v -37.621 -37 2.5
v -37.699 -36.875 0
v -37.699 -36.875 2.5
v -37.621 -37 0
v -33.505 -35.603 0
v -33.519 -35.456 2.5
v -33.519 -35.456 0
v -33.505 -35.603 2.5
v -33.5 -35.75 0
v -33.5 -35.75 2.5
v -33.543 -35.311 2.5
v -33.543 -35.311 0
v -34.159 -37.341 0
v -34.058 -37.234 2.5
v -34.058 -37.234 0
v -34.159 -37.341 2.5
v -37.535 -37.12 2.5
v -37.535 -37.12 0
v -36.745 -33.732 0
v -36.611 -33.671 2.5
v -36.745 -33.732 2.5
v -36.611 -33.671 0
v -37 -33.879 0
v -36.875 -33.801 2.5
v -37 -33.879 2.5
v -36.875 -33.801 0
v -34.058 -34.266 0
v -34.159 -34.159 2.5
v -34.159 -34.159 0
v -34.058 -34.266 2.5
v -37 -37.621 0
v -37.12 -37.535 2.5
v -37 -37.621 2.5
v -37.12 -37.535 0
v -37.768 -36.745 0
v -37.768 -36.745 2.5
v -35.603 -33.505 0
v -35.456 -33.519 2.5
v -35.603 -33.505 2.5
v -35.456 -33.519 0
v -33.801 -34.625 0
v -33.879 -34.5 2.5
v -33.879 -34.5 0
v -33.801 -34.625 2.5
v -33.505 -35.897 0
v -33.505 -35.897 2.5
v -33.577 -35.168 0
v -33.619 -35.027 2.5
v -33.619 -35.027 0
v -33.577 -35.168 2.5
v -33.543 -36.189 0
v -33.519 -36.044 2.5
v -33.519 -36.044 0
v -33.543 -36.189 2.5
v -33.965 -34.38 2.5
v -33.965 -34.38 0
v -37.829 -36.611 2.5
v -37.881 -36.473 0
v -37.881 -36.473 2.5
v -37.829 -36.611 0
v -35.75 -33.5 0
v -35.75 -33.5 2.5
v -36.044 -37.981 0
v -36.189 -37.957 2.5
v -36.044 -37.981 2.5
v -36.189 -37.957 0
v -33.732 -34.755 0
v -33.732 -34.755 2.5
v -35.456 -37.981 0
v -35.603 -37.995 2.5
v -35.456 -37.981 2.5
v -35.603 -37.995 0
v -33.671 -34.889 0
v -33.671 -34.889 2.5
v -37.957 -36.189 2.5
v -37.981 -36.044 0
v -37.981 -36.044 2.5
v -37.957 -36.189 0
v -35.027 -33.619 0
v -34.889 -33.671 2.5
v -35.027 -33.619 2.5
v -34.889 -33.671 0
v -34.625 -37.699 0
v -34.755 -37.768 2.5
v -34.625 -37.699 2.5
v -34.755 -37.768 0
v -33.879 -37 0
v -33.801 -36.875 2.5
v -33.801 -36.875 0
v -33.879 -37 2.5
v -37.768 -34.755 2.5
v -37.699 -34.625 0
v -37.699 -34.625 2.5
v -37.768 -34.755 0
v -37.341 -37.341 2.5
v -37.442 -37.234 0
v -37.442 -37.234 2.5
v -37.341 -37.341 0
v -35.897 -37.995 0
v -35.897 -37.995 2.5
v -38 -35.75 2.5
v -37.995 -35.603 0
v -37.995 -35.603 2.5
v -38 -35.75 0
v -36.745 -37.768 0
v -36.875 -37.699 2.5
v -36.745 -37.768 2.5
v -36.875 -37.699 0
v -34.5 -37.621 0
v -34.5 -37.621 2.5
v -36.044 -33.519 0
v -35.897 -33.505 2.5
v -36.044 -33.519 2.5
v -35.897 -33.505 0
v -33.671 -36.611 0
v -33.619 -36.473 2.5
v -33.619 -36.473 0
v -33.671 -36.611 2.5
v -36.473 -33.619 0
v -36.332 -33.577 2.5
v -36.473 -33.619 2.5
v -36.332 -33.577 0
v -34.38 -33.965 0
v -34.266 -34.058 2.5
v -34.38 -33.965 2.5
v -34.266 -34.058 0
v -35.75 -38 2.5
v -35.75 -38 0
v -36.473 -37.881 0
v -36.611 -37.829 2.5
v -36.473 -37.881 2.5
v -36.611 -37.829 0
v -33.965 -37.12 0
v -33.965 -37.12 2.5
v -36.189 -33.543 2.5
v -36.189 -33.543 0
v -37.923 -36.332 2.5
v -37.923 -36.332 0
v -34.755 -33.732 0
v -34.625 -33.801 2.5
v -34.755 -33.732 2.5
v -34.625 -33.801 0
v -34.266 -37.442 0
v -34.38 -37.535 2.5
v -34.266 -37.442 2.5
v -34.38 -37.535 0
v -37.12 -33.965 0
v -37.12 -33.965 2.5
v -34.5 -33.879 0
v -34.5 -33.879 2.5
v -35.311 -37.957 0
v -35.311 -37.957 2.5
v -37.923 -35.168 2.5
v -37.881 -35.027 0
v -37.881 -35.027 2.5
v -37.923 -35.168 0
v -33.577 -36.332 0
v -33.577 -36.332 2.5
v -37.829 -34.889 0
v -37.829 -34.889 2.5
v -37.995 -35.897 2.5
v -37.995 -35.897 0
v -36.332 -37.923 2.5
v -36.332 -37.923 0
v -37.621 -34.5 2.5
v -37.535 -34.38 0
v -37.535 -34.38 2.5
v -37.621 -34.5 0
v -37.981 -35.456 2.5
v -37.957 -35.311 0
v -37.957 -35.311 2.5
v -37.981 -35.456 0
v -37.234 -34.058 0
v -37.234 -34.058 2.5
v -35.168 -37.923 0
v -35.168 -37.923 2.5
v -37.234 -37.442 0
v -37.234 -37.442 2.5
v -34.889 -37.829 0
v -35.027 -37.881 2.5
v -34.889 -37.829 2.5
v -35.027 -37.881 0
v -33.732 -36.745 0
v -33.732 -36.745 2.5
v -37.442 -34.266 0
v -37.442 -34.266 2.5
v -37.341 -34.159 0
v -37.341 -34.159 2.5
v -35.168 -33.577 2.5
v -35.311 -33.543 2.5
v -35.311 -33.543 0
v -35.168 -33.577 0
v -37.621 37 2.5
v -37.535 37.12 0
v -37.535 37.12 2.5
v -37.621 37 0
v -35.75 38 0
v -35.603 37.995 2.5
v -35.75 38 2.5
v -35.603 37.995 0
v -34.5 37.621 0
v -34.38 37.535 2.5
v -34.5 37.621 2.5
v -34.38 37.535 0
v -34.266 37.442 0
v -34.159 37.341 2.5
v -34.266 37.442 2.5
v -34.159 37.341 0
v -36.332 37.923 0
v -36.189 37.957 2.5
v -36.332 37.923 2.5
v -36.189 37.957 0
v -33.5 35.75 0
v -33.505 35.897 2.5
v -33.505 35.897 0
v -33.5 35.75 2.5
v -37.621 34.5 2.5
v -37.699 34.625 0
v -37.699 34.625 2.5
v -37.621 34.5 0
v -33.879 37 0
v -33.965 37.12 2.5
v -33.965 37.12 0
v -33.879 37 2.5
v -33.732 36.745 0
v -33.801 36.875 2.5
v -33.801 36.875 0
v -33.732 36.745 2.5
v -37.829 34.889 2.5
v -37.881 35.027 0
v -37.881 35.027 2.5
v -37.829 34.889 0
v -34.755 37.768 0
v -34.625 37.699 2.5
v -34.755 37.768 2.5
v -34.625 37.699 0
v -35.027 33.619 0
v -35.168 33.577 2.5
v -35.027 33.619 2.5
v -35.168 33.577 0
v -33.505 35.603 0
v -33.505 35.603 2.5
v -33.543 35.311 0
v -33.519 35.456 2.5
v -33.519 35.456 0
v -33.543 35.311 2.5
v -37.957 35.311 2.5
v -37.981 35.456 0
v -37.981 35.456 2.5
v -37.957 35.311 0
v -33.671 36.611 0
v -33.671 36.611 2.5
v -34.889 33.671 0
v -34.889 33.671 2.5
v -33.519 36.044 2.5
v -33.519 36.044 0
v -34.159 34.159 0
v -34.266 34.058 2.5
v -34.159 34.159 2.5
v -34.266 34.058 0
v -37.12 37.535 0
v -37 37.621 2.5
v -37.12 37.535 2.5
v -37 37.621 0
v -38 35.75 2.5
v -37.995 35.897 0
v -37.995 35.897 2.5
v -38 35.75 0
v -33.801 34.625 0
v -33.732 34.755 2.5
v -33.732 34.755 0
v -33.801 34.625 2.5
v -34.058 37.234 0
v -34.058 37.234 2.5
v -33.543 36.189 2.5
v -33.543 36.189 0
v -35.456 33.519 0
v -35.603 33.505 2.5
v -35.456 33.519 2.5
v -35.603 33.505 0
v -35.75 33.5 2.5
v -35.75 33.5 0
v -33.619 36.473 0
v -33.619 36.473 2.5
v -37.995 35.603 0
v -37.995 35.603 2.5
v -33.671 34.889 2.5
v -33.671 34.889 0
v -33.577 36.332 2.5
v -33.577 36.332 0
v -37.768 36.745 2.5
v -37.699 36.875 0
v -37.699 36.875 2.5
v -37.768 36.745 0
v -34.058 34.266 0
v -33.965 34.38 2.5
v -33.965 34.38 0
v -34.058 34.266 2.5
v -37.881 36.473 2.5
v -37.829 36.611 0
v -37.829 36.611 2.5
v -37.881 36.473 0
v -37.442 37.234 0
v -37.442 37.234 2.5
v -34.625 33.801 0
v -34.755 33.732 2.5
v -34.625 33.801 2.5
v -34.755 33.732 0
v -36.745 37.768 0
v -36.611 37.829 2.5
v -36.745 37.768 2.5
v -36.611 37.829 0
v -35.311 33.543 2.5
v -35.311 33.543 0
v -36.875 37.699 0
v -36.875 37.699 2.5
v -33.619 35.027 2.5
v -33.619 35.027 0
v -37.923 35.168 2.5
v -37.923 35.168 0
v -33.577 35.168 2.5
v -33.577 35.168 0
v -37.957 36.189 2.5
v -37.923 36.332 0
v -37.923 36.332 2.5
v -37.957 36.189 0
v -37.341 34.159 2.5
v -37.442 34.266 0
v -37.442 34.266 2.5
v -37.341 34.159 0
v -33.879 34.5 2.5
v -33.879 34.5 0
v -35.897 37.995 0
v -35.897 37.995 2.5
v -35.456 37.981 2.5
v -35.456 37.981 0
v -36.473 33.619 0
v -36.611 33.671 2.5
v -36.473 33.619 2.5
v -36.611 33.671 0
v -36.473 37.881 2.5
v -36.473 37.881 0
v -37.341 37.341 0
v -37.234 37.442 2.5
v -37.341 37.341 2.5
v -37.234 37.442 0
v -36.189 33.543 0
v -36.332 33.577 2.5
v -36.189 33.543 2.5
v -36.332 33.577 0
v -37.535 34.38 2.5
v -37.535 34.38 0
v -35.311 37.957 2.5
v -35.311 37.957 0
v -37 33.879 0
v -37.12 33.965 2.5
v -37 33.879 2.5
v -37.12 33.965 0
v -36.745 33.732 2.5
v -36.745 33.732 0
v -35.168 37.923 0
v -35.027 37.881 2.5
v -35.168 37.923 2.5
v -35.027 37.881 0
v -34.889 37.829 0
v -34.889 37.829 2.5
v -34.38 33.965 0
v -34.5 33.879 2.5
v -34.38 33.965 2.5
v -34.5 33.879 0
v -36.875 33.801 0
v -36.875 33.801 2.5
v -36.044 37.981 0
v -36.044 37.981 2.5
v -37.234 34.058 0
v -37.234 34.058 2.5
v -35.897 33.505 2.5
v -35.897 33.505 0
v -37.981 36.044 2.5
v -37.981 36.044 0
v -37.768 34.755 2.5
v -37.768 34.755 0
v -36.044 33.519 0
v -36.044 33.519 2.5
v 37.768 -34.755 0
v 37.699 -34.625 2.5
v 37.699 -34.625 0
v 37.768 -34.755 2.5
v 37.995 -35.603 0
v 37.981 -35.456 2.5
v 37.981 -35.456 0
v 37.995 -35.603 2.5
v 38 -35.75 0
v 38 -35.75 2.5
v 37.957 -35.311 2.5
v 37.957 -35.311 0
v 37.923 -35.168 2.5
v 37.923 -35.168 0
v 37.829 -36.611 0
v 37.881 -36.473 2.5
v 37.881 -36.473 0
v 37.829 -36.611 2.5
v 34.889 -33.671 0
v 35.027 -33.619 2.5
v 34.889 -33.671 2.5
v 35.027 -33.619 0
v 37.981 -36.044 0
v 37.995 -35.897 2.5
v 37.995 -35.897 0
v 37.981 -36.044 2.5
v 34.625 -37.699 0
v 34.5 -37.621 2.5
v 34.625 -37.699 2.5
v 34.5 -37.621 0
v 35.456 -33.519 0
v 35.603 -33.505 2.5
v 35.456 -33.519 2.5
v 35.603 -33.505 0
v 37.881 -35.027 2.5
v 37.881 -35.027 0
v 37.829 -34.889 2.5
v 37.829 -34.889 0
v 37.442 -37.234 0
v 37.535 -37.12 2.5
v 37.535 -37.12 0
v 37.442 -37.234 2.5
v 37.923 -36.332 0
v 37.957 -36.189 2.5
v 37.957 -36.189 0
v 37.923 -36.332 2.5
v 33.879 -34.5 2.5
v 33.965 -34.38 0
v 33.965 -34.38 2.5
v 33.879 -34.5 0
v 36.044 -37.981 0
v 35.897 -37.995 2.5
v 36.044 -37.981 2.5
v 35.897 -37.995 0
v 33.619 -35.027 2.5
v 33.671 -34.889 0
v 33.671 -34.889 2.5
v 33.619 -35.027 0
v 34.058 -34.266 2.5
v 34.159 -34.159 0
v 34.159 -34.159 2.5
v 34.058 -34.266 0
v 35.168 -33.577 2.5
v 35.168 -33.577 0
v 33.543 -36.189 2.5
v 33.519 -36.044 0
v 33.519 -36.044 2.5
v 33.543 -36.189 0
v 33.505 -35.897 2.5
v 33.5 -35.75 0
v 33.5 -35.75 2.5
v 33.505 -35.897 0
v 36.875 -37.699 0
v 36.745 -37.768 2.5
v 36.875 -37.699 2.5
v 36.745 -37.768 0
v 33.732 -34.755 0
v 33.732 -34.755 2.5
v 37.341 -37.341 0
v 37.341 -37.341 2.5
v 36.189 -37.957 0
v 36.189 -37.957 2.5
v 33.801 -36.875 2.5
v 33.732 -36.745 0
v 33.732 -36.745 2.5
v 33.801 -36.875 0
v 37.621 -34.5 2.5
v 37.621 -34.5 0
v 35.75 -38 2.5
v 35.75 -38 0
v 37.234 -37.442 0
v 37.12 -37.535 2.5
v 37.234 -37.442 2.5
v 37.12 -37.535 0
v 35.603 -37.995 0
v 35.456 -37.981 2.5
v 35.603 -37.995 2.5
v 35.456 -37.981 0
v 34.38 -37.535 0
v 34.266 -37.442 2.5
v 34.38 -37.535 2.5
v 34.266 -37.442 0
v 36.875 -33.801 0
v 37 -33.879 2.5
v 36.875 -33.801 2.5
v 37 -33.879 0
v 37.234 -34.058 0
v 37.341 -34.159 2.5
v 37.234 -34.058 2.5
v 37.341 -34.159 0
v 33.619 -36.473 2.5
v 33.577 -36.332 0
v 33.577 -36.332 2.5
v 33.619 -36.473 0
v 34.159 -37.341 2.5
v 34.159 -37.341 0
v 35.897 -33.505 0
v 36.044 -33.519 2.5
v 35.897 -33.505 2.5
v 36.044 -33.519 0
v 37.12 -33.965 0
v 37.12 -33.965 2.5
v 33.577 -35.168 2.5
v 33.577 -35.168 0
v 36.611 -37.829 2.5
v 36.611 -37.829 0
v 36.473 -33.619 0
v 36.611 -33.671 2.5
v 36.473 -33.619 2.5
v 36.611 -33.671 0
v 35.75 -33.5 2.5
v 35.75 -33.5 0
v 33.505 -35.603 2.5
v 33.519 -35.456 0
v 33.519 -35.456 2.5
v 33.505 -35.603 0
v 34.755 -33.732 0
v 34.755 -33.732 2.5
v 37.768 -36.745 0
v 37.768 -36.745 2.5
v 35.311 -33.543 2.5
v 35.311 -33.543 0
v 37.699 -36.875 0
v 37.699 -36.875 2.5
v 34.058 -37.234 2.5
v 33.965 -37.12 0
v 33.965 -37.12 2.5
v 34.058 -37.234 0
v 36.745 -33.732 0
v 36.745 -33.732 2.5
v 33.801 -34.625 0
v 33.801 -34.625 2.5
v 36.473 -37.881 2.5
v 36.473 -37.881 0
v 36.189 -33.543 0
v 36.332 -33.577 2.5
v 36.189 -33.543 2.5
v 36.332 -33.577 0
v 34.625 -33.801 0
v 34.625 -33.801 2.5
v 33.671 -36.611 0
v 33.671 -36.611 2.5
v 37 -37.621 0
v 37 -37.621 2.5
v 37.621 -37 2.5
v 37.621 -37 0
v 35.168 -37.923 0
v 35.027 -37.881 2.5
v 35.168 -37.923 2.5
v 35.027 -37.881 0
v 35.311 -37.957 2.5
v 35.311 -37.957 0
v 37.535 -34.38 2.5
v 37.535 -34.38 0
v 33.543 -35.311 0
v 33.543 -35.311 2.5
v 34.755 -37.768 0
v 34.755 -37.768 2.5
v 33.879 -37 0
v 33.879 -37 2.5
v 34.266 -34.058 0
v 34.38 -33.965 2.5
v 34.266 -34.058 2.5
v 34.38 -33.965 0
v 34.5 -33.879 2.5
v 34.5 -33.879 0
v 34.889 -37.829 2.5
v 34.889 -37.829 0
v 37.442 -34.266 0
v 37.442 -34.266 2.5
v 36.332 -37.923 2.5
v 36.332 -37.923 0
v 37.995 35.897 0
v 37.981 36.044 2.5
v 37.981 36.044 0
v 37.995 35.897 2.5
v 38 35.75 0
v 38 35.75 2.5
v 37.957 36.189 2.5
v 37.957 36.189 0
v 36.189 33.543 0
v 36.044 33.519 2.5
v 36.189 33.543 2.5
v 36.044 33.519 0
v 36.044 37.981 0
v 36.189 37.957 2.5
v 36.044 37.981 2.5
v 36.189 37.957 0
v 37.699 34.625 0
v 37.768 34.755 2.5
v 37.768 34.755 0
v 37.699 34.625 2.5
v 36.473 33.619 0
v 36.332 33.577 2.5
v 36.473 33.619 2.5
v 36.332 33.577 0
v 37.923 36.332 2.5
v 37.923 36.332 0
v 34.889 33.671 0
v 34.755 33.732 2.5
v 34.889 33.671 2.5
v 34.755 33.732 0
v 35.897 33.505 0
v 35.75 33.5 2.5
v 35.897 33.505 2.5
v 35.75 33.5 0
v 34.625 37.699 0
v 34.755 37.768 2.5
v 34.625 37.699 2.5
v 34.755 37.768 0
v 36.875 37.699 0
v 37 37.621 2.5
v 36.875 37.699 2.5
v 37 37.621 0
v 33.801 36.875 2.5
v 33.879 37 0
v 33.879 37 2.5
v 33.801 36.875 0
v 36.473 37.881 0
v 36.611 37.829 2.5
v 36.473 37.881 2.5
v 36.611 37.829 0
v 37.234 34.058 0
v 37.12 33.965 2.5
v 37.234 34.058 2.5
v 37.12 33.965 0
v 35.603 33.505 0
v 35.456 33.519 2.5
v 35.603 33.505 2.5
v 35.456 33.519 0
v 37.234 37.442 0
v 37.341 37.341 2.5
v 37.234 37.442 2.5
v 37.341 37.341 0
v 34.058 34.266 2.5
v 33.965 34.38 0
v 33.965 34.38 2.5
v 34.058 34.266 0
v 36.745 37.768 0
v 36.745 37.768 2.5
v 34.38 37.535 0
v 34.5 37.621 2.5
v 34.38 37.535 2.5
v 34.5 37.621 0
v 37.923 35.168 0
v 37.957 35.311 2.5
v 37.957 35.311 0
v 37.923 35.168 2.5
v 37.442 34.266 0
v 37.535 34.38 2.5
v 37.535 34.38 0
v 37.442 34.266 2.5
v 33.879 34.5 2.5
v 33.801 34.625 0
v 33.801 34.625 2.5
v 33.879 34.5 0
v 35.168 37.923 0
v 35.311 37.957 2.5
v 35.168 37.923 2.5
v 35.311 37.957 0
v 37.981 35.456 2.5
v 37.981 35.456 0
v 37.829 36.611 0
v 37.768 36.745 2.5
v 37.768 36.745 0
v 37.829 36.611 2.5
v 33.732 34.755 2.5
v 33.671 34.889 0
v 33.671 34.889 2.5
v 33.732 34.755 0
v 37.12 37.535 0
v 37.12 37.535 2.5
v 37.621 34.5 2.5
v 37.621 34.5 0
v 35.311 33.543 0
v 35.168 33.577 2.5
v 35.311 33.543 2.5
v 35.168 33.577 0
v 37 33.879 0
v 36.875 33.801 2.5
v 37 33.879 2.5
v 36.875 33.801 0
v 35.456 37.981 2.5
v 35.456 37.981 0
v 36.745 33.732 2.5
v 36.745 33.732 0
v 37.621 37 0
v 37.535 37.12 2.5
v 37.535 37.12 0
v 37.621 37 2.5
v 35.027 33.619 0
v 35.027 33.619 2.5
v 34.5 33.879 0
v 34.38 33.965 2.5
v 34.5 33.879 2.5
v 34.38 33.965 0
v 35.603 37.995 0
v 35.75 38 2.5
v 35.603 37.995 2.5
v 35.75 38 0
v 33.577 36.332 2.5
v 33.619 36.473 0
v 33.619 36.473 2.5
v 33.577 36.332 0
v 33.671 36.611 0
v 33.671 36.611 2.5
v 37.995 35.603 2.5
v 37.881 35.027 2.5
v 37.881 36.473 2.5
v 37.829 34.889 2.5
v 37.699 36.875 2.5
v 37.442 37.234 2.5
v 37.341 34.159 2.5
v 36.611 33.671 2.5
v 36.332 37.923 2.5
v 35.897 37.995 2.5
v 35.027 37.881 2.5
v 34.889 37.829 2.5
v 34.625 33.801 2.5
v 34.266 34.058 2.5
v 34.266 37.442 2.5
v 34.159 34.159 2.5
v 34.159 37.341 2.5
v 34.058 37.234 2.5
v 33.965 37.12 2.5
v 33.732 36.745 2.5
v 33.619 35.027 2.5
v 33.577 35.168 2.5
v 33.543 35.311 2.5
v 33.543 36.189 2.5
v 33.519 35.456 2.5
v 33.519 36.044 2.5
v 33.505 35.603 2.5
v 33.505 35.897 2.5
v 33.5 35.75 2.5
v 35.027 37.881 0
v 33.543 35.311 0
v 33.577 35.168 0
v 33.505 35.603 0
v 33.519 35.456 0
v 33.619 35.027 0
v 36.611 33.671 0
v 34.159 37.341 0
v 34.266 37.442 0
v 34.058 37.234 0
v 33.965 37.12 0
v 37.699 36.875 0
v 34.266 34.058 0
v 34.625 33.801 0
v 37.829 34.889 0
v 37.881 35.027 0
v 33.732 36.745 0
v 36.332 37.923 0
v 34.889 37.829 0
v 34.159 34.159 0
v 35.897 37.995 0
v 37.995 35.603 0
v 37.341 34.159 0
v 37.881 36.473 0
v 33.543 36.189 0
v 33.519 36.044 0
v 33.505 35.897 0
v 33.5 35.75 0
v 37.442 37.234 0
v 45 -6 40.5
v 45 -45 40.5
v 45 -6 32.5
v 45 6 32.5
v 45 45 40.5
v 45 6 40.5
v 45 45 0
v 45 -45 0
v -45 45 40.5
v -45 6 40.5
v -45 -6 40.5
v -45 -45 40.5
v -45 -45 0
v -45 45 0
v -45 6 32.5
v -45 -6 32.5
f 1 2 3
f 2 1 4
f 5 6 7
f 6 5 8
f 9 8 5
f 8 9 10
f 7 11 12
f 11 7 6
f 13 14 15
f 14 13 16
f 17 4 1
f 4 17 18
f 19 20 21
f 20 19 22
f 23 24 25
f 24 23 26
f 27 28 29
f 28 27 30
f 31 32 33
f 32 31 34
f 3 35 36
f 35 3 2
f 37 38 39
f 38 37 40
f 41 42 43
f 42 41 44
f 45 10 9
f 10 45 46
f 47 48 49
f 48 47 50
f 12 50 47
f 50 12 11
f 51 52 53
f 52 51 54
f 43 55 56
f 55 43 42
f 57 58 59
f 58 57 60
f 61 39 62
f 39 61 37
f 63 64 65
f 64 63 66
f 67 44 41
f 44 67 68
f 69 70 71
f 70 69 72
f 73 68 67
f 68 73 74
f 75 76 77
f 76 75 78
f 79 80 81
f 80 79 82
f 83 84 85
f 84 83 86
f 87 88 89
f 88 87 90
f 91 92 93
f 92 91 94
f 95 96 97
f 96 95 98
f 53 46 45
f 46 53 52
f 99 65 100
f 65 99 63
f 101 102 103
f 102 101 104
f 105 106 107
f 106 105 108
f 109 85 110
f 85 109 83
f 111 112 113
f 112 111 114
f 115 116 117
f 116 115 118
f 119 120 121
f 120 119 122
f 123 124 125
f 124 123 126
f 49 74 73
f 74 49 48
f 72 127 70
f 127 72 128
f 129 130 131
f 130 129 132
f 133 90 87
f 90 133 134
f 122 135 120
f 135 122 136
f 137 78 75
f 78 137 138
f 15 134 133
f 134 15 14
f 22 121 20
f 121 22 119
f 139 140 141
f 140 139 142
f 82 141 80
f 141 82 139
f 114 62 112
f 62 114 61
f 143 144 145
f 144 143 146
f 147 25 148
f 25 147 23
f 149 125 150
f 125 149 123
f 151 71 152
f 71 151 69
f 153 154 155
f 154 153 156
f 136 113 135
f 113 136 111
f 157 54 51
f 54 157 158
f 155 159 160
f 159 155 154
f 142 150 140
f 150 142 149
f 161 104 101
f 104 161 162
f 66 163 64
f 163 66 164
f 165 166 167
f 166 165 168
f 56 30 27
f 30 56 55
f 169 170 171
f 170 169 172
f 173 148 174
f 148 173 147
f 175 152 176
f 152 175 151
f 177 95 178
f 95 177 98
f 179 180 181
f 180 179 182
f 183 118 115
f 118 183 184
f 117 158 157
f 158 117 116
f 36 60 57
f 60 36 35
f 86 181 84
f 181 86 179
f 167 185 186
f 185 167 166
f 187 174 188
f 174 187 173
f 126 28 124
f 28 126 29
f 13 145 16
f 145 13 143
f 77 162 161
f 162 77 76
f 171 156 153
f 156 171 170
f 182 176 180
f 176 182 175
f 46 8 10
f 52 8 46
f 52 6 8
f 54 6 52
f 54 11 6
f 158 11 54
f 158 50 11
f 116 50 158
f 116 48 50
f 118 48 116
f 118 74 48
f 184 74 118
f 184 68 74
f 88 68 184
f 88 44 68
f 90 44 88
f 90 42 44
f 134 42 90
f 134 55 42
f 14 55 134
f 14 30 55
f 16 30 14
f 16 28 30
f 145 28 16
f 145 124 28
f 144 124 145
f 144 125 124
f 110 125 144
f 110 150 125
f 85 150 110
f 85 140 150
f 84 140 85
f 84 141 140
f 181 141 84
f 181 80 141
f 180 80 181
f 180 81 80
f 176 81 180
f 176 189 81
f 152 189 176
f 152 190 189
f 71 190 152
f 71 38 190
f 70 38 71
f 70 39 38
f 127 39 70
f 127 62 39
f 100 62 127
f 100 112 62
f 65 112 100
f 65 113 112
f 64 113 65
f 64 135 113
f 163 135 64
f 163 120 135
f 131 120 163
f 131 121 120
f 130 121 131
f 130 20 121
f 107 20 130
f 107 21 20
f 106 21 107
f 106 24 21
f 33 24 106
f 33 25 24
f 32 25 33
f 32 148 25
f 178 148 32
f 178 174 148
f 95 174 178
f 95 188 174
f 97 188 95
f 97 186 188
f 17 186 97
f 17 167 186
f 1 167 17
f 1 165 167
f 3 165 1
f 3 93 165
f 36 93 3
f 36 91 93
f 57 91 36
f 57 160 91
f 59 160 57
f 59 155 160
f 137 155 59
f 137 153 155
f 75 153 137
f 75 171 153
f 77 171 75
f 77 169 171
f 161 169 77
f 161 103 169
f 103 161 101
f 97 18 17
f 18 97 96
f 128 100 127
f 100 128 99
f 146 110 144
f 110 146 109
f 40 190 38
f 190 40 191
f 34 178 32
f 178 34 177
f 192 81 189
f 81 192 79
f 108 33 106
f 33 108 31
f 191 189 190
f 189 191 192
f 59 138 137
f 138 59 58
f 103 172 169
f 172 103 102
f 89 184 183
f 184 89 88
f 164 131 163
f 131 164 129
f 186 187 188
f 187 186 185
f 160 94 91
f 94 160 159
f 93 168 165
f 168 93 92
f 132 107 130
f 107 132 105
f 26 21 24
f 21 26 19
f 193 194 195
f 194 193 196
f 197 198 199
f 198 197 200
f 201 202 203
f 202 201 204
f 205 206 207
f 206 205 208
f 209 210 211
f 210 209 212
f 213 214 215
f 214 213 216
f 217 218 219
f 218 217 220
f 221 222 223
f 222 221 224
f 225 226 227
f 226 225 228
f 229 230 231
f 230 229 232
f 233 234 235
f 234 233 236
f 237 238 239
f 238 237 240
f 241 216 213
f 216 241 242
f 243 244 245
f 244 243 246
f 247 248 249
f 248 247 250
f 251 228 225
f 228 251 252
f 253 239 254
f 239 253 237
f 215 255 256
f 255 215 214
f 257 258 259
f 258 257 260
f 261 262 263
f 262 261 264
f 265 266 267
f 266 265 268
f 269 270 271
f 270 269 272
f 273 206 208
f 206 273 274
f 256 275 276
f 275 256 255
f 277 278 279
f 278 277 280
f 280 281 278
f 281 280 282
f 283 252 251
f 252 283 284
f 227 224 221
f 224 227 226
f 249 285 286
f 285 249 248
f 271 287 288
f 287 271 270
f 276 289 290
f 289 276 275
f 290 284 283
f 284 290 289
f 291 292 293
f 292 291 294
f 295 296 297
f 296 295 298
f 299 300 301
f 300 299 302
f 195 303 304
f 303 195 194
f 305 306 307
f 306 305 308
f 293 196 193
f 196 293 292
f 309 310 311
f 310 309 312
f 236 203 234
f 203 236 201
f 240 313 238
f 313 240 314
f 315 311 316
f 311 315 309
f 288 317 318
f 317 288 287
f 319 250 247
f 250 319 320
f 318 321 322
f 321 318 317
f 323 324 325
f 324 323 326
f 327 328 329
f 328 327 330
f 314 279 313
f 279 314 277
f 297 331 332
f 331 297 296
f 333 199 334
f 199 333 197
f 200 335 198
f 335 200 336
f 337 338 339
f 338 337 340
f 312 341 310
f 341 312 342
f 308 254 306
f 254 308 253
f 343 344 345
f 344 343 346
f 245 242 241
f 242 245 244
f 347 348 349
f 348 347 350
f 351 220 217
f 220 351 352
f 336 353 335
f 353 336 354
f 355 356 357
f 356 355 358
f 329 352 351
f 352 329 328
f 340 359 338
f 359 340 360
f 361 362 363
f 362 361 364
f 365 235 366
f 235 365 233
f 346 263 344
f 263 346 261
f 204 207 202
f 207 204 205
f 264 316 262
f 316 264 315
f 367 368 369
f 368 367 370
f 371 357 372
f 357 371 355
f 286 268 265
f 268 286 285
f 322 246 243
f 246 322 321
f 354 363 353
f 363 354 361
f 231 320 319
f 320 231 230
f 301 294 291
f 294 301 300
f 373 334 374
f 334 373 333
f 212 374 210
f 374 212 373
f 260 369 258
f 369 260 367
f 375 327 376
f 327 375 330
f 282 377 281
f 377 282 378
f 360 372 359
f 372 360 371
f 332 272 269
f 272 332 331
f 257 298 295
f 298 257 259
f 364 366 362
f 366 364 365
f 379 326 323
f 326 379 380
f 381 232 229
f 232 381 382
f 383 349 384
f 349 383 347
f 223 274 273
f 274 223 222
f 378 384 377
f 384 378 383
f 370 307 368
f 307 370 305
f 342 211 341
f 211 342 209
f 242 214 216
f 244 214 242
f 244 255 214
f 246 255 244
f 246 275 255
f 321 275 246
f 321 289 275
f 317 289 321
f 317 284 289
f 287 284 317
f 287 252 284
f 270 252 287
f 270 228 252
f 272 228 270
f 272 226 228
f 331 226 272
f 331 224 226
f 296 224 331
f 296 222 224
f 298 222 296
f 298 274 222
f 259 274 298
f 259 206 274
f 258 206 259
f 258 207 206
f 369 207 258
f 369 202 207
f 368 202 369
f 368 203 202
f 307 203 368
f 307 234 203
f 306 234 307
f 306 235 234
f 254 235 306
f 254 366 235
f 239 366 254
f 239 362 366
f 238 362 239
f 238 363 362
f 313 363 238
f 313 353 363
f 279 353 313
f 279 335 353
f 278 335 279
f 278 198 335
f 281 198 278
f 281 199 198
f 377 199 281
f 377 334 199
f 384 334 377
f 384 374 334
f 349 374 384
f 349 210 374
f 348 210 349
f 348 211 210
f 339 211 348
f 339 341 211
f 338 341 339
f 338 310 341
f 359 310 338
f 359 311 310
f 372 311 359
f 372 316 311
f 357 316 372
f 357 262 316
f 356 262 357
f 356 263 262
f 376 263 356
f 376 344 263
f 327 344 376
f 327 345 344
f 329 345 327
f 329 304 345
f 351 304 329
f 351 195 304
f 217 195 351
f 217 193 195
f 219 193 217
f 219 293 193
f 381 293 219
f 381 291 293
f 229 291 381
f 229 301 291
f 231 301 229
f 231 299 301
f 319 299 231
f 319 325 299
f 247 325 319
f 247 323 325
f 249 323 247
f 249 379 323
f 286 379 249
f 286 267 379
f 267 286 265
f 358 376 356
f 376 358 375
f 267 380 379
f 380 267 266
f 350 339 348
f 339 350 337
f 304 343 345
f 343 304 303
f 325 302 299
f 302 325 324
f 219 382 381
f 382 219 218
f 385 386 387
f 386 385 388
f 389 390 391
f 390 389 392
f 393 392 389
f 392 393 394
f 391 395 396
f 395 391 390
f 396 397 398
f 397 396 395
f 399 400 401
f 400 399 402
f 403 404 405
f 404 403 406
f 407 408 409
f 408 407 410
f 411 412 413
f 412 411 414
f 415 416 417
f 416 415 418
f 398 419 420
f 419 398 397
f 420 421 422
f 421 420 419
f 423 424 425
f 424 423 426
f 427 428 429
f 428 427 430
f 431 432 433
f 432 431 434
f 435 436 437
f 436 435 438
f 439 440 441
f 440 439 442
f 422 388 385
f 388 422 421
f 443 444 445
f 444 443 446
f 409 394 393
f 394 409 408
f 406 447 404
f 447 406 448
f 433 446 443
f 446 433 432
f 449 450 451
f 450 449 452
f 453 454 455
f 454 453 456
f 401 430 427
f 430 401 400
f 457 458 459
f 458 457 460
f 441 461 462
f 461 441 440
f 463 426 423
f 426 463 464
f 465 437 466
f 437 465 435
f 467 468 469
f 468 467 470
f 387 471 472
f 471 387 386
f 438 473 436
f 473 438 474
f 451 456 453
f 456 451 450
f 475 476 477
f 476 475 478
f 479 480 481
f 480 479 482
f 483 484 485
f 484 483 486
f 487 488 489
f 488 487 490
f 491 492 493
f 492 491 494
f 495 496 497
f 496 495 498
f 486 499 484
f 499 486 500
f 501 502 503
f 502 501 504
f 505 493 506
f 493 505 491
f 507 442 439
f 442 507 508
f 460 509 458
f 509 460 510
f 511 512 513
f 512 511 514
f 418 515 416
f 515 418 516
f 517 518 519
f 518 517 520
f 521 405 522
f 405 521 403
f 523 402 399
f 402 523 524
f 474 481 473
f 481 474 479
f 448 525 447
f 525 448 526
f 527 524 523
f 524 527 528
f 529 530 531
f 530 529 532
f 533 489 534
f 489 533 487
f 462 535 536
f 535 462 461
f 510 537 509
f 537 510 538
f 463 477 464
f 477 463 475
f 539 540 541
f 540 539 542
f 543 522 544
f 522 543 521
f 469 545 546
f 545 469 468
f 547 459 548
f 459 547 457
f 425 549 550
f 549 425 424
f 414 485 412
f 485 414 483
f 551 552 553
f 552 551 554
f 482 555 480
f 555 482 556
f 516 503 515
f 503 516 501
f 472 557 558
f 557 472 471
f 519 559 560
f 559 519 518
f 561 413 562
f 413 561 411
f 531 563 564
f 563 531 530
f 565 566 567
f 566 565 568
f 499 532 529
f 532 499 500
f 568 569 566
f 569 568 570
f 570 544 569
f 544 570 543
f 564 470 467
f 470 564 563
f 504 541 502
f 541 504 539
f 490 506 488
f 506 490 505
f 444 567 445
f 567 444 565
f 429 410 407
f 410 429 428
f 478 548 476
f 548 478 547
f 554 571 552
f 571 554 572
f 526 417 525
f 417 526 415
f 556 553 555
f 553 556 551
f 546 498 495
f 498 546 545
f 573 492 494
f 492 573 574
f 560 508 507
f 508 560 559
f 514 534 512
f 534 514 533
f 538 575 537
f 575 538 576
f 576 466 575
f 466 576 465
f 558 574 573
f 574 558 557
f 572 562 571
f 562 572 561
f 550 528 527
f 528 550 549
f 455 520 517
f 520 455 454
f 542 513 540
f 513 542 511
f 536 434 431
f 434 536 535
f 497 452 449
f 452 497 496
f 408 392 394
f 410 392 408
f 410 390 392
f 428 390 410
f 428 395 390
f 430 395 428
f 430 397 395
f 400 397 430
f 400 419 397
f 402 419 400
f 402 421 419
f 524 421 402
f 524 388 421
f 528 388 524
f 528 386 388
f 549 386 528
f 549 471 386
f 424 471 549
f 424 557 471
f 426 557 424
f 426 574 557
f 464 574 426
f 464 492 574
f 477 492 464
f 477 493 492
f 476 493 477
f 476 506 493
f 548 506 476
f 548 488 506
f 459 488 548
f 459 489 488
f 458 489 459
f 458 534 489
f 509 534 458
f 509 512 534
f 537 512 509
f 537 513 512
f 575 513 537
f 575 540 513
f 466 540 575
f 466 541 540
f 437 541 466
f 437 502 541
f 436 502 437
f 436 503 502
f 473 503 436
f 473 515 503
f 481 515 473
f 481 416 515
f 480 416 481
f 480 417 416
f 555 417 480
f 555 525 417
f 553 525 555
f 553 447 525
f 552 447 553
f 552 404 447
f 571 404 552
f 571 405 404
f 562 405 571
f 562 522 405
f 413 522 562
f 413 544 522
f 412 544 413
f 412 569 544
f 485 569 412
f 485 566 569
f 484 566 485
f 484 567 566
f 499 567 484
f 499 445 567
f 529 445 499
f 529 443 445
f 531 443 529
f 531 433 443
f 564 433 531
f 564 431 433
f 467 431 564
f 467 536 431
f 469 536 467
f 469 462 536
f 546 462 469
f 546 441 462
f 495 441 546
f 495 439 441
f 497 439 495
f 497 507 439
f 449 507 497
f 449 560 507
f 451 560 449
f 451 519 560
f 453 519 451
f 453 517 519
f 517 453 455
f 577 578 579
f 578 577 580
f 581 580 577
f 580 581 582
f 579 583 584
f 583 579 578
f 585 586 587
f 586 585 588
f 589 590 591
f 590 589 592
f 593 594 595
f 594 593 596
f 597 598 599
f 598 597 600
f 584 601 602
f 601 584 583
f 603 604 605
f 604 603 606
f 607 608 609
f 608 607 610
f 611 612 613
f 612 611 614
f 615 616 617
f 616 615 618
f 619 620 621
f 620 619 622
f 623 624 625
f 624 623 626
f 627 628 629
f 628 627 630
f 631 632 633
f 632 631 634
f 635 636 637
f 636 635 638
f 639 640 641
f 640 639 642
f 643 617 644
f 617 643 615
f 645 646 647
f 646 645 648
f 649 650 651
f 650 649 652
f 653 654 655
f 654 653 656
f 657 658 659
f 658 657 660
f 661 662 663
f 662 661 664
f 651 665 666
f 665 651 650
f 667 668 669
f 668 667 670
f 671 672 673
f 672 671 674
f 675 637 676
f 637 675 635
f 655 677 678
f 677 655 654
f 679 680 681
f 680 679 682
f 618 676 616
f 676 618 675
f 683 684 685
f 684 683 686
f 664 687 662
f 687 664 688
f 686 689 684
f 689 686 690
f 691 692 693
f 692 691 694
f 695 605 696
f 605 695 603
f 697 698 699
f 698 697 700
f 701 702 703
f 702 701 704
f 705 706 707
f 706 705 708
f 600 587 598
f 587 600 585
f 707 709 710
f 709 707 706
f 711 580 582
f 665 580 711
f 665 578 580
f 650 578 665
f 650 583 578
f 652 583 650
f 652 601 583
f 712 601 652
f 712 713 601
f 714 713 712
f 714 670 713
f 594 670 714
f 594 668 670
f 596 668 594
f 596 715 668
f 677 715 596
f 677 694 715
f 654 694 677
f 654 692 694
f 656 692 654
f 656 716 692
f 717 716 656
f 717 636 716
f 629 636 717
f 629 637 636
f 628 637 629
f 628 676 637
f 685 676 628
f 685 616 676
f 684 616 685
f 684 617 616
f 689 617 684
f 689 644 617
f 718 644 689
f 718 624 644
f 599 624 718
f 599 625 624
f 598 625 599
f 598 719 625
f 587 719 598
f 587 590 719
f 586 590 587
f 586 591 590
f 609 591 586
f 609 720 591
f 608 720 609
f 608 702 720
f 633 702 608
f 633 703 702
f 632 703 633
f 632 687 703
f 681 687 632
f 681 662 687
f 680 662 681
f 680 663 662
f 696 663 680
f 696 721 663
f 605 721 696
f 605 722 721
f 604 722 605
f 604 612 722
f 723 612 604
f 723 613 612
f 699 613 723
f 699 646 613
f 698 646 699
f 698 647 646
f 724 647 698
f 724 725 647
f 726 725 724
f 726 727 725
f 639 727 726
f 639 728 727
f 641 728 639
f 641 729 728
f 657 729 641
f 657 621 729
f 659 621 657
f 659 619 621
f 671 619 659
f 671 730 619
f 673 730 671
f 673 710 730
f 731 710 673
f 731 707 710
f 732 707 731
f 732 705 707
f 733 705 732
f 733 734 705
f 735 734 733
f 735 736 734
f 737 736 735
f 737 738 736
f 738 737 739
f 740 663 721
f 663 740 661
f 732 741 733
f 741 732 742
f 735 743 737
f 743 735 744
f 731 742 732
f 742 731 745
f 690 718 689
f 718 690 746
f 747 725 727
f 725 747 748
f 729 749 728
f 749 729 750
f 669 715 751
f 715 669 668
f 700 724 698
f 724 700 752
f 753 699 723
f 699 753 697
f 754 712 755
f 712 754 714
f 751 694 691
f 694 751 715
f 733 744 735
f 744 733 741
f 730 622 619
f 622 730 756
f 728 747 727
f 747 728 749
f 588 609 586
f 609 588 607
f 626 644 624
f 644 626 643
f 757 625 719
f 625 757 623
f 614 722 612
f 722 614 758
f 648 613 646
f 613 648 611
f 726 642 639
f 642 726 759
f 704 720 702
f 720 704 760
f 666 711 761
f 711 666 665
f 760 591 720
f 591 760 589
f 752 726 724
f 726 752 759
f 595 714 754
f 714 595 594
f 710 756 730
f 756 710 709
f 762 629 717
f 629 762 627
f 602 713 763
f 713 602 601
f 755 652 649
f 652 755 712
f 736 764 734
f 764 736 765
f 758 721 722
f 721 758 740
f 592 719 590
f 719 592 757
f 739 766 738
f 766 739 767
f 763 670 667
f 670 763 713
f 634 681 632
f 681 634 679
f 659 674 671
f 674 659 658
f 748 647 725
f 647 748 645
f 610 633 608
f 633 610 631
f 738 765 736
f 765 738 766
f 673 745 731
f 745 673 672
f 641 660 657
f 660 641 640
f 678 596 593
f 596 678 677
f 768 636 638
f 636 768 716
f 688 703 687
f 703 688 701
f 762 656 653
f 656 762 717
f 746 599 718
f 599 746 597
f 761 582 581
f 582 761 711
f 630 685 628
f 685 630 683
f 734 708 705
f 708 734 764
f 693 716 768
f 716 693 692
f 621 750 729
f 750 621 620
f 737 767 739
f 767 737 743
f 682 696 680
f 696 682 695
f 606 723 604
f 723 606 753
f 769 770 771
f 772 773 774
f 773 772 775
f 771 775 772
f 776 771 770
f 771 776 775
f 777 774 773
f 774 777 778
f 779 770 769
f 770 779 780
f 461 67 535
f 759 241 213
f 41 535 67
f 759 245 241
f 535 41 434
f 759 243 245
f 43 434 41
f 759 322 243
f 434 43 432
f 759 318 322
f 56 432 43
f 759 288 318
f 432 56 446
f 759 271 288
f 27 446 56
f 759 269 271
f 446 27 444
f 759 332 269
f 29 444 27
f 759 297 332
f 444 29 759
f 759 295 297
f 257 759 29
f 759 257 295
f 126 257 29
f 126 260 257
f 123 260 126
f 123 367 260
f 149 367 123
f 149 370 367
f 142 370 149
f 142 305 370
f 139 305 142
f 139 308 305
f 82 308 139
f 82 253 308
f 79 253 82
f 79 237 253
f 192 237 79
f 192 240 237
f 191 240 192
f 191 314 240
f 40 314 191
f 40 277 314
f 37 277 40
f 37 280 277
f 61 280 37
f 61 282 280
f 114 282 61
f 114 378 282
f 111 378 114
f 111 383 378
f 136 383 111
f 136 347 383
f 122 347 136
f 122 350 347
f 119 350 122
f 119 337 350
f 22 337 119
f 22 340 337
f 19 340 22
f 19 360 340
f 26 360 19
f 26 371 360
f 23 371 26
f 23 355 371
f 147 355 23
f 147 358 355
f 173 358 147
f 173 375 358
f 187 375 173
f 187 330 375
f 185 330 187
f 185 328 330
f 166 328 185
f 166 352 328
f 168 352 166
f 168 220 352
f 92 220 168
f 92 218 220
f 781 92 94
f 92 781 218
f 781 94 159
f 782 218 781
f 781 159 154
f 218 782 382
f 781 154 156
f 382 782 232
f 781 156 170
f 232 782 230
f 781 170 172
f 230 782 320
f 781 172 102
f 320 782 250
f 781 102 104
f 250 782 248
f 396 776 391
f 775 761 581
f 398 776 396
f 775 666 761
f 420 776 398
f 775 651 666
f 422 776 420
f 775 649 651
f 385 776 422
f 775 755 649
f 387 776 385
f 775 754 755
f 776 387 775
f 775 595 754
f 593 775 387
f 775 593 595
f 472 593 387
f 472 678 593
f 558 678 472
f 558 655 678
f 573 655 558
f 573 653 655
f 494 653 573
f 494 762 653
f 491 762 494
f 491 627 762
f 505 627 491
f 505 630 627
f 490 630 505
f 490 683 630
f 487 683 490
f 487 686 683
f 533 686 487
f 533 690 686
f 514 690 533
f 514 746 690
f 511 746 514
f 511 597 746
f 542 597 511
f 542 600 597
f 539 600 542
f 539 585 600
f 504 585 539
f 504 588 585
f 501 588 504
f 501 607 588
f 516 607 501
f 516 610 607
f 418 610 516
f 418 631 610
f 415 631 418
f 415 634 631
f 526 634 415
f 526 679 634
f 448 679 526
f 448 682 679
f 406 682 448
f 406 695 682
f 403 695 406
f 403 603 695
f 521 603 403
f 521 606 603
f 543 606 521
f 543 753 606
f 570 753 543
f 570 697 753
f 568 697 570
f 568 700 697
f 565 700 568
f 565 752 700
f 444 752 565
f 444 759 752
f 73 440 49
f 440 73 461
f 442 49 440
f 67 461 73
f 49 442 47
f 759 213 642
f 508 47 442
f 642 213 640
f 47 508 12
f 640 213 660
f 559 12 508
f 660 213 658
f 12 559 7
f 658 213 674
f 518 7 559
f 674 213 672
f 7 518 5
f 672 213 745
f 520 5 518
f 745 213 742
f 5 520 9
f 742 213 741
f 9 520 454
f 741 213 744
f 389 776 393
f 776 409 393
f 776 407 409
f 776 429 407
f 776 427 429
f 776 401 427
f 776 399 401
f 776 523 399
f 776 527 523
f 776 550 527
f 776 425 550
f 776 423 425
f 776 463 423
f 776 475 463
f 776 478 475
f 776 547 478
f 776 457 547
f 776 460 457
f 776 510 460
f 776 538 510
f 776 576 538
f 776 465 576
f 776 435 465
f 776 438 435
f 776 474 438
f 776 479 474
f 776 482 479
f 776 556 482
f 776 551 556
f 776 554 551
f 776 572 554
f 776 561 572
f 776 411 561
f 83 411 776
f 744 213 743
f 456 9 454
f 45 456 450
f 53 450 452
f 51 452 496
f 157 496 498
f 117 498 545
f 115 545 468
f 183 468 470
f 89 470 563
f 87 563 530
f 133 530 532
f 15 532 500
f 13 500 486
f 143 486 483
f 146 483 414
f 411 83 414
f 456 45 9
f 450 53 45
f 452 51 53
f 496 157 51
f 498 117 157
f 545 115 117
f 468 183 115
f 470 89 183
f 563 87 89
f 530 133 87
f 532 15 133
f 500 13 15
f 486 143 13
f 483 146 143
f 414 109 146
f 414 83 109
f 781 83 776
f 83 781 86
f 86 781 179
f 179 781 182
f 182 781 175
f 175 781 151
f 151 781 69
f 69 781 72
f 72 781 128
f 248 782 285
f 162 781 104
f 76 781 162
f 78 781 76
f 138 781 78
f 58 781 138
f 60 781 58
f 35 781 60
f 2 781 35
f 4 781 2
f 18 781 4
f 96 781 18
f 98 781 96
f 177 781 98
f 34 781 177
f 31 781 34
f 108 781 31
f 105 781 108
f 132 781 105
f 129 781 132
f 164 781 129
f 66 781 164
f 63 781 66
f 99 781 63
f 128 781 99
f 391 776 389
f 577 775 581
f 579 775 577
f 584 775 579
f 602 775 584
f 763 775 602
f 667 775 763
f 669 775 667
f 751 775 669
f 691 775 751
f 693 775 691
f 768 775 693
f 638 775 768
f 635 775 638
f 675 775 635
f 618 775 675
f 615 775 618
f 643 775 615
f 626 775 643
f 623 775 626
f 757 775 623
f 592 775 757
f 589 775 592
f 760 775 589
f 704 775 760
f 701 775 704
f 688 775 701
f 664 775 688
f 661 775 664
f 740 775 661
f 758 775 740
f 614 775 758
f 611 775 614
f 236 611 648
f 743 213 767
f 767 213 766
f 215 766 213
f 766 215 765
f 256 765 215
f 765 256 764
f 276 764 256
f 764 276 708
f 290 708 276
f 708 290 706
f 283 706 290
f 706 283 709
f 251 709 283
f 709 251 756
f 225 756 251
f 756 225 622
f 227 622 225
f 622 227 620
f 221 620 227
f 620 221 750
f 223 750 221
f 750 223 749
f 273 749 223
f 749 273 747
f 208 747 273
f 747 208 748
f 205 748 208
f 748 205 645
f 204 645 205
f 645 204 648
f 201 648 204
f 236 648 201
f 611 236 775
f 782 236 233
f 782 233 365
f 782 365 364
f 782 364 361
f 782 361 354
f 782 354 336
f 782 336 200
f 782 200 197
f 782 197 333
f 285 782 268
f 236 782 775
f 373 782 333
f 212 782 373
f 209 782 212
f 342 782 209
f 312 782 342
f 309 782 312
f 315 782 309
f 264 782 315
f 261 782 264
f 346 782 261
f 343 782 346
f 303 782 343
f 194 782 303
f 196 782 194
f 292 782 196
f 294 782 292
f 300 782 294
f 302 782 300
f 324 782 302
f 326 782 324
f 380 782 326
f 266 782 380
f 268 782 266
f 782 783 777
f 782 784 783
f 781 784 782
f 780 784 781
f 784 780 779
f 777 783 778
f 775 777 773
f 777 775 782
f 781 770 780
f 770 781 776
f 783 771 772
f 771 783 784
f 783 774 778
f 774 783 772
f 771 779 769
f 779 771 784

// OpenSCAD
// DIY magnetic stirrer housing for 80 mm PC case fan
// Print orientation: top plate on bed (z = 0), walls rise to open top at z = 40

// ---------- Parameters ----------
fan_d        = 80;    // fan diameter (mm)
outer_x      = 90;    // outer size in X (mm)
outer_y      = 90;    // outer size in Y (mm)
wall         = 2.5;   // wall thickness (mm)
top_t        = 2;     // top plate thickness (mm)
open_h       = 40 - top_t; // height of open box (mm)
screw_d      = 4.5;   // M4 screw hole diameter (mm)
screw_pitch  = 71.5;  // square pattern side for screw holes (mm)
notch_w      = 12;    // cable notch width (mm)
notch_depth  = 8;     // cable notch depth from open edge (mm)
eps          = 0.5;   // cutter overshoot past faces (mm)
$fn          = 96;    // curve resolution

// ---------- Model ----------
difference() {
    // Solid block: top plate + four walls, open top
    translate([-outer_x/2, -outer_y/2, 0])
        cube([outer_x, outer_y, open_h + wall]);

    // Screw holes through top plate, centred on plate
    for (sx = [-screw_pitch/2, screw_pitch/2])
        for (sy = [-screw_pitch/2, screw_pitch/2])
            translate([sx, sy, -eps])
                cylinder(d = screw_d, h = top_t + 2*eps);

    // Cable notch in one wall: centred along wall, 8 mm down from open edge
    translate([-outer_x/2, -notch_w/2, open_h + wall - notch_depth])
        cube([outer_x, notch_w, notch_depth + eps]);
}
